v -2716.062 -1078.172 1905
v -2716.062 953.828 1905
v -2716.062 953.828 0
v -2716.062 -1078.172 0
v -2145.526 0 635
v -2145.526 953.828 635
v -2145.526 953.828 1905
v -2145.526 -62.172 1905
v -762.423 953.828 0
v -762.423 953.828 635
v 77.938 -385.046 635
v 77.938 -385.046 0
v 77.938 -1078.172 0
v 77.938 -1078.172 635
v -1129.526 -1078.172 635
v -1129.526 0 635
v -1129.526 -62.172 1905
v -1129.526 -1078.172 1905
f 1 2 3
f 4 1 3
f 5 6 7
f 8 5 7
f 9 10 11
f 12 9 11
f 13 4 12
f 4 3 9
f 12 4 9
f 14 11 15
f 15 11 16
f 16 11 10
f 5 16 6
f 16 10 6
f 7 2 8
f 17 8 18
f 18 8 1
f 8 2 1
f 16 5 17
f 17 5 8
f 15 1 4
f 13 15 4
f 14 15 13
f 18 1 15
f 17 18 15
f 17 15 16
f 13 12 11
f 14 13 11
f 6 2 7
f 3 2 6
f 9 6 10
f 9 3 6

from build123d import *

# Parameters (mm, degrees)
F0_W     = 2794
F0_H     = 1016
F2_DEPTH = 635
F3_W     = 570.535608
F3_H     = 1016
F4_DEPTH = 1270
F5_DEPTH = 1016
F7_DEPTH = 1016
F9_DEPTH = 2540


with BuildPart() as f2:
    # F0 (on Top) → F2 (new body)
    with BuildSketch(Plane.XY):
        with Locations((-1319.062017, 445.828477)):
            Rectangle(F0_W, F0_H)
    extrude(amount=F2_DEPTH)

    # F3 (on face) → F4 (join)
    with BuildSketch(Plane.XY.offset(635)):
        with Locations((-2430.794213, 445.828477)):
            Rectangle(F3_W, F3_H)
    extrude(amount=F4_DEPTH)

    # F4_face (on face) → F5 (join)
    with BuildSketch(Plane(origin=(-1641.436261, -62.171523, 593.700931), x_dir=(1, 0, 0), z_dir=(0, -1, 0))):
        Polygon((-1074.625756, 1311.299069), (-1074.625756, -593.700931), (1719.374244, -593.700931), (1719.374244, 41.299069), (-504.090148, 41.299069), (-504.090148, 1311.299069), align=None)
    extrude(amount=F5_DEPTH)

    # F6 (on face) → F7 (join)
    with BuildSketch(Plane.YZ.offset(-2145.526409)):
        Polygon((0, 635), (-62.171523, 1905), (-1078.171523, 1905), (-1078.171523, 635), align=None)
    extrude(amount=F7_DEPTH)

    # F8 (on face) → F9 (cut)
    with BuildSketch(Plane.XY.offset(635)):
        Polygon((77.937983, 953.828477), (-762.422621, 953.828477), (77.937983, -385.046184), align=None)
    extrude(amount=-F9_DEPTH, mode=Mode.SUBTRACT)


solid = f2.part
